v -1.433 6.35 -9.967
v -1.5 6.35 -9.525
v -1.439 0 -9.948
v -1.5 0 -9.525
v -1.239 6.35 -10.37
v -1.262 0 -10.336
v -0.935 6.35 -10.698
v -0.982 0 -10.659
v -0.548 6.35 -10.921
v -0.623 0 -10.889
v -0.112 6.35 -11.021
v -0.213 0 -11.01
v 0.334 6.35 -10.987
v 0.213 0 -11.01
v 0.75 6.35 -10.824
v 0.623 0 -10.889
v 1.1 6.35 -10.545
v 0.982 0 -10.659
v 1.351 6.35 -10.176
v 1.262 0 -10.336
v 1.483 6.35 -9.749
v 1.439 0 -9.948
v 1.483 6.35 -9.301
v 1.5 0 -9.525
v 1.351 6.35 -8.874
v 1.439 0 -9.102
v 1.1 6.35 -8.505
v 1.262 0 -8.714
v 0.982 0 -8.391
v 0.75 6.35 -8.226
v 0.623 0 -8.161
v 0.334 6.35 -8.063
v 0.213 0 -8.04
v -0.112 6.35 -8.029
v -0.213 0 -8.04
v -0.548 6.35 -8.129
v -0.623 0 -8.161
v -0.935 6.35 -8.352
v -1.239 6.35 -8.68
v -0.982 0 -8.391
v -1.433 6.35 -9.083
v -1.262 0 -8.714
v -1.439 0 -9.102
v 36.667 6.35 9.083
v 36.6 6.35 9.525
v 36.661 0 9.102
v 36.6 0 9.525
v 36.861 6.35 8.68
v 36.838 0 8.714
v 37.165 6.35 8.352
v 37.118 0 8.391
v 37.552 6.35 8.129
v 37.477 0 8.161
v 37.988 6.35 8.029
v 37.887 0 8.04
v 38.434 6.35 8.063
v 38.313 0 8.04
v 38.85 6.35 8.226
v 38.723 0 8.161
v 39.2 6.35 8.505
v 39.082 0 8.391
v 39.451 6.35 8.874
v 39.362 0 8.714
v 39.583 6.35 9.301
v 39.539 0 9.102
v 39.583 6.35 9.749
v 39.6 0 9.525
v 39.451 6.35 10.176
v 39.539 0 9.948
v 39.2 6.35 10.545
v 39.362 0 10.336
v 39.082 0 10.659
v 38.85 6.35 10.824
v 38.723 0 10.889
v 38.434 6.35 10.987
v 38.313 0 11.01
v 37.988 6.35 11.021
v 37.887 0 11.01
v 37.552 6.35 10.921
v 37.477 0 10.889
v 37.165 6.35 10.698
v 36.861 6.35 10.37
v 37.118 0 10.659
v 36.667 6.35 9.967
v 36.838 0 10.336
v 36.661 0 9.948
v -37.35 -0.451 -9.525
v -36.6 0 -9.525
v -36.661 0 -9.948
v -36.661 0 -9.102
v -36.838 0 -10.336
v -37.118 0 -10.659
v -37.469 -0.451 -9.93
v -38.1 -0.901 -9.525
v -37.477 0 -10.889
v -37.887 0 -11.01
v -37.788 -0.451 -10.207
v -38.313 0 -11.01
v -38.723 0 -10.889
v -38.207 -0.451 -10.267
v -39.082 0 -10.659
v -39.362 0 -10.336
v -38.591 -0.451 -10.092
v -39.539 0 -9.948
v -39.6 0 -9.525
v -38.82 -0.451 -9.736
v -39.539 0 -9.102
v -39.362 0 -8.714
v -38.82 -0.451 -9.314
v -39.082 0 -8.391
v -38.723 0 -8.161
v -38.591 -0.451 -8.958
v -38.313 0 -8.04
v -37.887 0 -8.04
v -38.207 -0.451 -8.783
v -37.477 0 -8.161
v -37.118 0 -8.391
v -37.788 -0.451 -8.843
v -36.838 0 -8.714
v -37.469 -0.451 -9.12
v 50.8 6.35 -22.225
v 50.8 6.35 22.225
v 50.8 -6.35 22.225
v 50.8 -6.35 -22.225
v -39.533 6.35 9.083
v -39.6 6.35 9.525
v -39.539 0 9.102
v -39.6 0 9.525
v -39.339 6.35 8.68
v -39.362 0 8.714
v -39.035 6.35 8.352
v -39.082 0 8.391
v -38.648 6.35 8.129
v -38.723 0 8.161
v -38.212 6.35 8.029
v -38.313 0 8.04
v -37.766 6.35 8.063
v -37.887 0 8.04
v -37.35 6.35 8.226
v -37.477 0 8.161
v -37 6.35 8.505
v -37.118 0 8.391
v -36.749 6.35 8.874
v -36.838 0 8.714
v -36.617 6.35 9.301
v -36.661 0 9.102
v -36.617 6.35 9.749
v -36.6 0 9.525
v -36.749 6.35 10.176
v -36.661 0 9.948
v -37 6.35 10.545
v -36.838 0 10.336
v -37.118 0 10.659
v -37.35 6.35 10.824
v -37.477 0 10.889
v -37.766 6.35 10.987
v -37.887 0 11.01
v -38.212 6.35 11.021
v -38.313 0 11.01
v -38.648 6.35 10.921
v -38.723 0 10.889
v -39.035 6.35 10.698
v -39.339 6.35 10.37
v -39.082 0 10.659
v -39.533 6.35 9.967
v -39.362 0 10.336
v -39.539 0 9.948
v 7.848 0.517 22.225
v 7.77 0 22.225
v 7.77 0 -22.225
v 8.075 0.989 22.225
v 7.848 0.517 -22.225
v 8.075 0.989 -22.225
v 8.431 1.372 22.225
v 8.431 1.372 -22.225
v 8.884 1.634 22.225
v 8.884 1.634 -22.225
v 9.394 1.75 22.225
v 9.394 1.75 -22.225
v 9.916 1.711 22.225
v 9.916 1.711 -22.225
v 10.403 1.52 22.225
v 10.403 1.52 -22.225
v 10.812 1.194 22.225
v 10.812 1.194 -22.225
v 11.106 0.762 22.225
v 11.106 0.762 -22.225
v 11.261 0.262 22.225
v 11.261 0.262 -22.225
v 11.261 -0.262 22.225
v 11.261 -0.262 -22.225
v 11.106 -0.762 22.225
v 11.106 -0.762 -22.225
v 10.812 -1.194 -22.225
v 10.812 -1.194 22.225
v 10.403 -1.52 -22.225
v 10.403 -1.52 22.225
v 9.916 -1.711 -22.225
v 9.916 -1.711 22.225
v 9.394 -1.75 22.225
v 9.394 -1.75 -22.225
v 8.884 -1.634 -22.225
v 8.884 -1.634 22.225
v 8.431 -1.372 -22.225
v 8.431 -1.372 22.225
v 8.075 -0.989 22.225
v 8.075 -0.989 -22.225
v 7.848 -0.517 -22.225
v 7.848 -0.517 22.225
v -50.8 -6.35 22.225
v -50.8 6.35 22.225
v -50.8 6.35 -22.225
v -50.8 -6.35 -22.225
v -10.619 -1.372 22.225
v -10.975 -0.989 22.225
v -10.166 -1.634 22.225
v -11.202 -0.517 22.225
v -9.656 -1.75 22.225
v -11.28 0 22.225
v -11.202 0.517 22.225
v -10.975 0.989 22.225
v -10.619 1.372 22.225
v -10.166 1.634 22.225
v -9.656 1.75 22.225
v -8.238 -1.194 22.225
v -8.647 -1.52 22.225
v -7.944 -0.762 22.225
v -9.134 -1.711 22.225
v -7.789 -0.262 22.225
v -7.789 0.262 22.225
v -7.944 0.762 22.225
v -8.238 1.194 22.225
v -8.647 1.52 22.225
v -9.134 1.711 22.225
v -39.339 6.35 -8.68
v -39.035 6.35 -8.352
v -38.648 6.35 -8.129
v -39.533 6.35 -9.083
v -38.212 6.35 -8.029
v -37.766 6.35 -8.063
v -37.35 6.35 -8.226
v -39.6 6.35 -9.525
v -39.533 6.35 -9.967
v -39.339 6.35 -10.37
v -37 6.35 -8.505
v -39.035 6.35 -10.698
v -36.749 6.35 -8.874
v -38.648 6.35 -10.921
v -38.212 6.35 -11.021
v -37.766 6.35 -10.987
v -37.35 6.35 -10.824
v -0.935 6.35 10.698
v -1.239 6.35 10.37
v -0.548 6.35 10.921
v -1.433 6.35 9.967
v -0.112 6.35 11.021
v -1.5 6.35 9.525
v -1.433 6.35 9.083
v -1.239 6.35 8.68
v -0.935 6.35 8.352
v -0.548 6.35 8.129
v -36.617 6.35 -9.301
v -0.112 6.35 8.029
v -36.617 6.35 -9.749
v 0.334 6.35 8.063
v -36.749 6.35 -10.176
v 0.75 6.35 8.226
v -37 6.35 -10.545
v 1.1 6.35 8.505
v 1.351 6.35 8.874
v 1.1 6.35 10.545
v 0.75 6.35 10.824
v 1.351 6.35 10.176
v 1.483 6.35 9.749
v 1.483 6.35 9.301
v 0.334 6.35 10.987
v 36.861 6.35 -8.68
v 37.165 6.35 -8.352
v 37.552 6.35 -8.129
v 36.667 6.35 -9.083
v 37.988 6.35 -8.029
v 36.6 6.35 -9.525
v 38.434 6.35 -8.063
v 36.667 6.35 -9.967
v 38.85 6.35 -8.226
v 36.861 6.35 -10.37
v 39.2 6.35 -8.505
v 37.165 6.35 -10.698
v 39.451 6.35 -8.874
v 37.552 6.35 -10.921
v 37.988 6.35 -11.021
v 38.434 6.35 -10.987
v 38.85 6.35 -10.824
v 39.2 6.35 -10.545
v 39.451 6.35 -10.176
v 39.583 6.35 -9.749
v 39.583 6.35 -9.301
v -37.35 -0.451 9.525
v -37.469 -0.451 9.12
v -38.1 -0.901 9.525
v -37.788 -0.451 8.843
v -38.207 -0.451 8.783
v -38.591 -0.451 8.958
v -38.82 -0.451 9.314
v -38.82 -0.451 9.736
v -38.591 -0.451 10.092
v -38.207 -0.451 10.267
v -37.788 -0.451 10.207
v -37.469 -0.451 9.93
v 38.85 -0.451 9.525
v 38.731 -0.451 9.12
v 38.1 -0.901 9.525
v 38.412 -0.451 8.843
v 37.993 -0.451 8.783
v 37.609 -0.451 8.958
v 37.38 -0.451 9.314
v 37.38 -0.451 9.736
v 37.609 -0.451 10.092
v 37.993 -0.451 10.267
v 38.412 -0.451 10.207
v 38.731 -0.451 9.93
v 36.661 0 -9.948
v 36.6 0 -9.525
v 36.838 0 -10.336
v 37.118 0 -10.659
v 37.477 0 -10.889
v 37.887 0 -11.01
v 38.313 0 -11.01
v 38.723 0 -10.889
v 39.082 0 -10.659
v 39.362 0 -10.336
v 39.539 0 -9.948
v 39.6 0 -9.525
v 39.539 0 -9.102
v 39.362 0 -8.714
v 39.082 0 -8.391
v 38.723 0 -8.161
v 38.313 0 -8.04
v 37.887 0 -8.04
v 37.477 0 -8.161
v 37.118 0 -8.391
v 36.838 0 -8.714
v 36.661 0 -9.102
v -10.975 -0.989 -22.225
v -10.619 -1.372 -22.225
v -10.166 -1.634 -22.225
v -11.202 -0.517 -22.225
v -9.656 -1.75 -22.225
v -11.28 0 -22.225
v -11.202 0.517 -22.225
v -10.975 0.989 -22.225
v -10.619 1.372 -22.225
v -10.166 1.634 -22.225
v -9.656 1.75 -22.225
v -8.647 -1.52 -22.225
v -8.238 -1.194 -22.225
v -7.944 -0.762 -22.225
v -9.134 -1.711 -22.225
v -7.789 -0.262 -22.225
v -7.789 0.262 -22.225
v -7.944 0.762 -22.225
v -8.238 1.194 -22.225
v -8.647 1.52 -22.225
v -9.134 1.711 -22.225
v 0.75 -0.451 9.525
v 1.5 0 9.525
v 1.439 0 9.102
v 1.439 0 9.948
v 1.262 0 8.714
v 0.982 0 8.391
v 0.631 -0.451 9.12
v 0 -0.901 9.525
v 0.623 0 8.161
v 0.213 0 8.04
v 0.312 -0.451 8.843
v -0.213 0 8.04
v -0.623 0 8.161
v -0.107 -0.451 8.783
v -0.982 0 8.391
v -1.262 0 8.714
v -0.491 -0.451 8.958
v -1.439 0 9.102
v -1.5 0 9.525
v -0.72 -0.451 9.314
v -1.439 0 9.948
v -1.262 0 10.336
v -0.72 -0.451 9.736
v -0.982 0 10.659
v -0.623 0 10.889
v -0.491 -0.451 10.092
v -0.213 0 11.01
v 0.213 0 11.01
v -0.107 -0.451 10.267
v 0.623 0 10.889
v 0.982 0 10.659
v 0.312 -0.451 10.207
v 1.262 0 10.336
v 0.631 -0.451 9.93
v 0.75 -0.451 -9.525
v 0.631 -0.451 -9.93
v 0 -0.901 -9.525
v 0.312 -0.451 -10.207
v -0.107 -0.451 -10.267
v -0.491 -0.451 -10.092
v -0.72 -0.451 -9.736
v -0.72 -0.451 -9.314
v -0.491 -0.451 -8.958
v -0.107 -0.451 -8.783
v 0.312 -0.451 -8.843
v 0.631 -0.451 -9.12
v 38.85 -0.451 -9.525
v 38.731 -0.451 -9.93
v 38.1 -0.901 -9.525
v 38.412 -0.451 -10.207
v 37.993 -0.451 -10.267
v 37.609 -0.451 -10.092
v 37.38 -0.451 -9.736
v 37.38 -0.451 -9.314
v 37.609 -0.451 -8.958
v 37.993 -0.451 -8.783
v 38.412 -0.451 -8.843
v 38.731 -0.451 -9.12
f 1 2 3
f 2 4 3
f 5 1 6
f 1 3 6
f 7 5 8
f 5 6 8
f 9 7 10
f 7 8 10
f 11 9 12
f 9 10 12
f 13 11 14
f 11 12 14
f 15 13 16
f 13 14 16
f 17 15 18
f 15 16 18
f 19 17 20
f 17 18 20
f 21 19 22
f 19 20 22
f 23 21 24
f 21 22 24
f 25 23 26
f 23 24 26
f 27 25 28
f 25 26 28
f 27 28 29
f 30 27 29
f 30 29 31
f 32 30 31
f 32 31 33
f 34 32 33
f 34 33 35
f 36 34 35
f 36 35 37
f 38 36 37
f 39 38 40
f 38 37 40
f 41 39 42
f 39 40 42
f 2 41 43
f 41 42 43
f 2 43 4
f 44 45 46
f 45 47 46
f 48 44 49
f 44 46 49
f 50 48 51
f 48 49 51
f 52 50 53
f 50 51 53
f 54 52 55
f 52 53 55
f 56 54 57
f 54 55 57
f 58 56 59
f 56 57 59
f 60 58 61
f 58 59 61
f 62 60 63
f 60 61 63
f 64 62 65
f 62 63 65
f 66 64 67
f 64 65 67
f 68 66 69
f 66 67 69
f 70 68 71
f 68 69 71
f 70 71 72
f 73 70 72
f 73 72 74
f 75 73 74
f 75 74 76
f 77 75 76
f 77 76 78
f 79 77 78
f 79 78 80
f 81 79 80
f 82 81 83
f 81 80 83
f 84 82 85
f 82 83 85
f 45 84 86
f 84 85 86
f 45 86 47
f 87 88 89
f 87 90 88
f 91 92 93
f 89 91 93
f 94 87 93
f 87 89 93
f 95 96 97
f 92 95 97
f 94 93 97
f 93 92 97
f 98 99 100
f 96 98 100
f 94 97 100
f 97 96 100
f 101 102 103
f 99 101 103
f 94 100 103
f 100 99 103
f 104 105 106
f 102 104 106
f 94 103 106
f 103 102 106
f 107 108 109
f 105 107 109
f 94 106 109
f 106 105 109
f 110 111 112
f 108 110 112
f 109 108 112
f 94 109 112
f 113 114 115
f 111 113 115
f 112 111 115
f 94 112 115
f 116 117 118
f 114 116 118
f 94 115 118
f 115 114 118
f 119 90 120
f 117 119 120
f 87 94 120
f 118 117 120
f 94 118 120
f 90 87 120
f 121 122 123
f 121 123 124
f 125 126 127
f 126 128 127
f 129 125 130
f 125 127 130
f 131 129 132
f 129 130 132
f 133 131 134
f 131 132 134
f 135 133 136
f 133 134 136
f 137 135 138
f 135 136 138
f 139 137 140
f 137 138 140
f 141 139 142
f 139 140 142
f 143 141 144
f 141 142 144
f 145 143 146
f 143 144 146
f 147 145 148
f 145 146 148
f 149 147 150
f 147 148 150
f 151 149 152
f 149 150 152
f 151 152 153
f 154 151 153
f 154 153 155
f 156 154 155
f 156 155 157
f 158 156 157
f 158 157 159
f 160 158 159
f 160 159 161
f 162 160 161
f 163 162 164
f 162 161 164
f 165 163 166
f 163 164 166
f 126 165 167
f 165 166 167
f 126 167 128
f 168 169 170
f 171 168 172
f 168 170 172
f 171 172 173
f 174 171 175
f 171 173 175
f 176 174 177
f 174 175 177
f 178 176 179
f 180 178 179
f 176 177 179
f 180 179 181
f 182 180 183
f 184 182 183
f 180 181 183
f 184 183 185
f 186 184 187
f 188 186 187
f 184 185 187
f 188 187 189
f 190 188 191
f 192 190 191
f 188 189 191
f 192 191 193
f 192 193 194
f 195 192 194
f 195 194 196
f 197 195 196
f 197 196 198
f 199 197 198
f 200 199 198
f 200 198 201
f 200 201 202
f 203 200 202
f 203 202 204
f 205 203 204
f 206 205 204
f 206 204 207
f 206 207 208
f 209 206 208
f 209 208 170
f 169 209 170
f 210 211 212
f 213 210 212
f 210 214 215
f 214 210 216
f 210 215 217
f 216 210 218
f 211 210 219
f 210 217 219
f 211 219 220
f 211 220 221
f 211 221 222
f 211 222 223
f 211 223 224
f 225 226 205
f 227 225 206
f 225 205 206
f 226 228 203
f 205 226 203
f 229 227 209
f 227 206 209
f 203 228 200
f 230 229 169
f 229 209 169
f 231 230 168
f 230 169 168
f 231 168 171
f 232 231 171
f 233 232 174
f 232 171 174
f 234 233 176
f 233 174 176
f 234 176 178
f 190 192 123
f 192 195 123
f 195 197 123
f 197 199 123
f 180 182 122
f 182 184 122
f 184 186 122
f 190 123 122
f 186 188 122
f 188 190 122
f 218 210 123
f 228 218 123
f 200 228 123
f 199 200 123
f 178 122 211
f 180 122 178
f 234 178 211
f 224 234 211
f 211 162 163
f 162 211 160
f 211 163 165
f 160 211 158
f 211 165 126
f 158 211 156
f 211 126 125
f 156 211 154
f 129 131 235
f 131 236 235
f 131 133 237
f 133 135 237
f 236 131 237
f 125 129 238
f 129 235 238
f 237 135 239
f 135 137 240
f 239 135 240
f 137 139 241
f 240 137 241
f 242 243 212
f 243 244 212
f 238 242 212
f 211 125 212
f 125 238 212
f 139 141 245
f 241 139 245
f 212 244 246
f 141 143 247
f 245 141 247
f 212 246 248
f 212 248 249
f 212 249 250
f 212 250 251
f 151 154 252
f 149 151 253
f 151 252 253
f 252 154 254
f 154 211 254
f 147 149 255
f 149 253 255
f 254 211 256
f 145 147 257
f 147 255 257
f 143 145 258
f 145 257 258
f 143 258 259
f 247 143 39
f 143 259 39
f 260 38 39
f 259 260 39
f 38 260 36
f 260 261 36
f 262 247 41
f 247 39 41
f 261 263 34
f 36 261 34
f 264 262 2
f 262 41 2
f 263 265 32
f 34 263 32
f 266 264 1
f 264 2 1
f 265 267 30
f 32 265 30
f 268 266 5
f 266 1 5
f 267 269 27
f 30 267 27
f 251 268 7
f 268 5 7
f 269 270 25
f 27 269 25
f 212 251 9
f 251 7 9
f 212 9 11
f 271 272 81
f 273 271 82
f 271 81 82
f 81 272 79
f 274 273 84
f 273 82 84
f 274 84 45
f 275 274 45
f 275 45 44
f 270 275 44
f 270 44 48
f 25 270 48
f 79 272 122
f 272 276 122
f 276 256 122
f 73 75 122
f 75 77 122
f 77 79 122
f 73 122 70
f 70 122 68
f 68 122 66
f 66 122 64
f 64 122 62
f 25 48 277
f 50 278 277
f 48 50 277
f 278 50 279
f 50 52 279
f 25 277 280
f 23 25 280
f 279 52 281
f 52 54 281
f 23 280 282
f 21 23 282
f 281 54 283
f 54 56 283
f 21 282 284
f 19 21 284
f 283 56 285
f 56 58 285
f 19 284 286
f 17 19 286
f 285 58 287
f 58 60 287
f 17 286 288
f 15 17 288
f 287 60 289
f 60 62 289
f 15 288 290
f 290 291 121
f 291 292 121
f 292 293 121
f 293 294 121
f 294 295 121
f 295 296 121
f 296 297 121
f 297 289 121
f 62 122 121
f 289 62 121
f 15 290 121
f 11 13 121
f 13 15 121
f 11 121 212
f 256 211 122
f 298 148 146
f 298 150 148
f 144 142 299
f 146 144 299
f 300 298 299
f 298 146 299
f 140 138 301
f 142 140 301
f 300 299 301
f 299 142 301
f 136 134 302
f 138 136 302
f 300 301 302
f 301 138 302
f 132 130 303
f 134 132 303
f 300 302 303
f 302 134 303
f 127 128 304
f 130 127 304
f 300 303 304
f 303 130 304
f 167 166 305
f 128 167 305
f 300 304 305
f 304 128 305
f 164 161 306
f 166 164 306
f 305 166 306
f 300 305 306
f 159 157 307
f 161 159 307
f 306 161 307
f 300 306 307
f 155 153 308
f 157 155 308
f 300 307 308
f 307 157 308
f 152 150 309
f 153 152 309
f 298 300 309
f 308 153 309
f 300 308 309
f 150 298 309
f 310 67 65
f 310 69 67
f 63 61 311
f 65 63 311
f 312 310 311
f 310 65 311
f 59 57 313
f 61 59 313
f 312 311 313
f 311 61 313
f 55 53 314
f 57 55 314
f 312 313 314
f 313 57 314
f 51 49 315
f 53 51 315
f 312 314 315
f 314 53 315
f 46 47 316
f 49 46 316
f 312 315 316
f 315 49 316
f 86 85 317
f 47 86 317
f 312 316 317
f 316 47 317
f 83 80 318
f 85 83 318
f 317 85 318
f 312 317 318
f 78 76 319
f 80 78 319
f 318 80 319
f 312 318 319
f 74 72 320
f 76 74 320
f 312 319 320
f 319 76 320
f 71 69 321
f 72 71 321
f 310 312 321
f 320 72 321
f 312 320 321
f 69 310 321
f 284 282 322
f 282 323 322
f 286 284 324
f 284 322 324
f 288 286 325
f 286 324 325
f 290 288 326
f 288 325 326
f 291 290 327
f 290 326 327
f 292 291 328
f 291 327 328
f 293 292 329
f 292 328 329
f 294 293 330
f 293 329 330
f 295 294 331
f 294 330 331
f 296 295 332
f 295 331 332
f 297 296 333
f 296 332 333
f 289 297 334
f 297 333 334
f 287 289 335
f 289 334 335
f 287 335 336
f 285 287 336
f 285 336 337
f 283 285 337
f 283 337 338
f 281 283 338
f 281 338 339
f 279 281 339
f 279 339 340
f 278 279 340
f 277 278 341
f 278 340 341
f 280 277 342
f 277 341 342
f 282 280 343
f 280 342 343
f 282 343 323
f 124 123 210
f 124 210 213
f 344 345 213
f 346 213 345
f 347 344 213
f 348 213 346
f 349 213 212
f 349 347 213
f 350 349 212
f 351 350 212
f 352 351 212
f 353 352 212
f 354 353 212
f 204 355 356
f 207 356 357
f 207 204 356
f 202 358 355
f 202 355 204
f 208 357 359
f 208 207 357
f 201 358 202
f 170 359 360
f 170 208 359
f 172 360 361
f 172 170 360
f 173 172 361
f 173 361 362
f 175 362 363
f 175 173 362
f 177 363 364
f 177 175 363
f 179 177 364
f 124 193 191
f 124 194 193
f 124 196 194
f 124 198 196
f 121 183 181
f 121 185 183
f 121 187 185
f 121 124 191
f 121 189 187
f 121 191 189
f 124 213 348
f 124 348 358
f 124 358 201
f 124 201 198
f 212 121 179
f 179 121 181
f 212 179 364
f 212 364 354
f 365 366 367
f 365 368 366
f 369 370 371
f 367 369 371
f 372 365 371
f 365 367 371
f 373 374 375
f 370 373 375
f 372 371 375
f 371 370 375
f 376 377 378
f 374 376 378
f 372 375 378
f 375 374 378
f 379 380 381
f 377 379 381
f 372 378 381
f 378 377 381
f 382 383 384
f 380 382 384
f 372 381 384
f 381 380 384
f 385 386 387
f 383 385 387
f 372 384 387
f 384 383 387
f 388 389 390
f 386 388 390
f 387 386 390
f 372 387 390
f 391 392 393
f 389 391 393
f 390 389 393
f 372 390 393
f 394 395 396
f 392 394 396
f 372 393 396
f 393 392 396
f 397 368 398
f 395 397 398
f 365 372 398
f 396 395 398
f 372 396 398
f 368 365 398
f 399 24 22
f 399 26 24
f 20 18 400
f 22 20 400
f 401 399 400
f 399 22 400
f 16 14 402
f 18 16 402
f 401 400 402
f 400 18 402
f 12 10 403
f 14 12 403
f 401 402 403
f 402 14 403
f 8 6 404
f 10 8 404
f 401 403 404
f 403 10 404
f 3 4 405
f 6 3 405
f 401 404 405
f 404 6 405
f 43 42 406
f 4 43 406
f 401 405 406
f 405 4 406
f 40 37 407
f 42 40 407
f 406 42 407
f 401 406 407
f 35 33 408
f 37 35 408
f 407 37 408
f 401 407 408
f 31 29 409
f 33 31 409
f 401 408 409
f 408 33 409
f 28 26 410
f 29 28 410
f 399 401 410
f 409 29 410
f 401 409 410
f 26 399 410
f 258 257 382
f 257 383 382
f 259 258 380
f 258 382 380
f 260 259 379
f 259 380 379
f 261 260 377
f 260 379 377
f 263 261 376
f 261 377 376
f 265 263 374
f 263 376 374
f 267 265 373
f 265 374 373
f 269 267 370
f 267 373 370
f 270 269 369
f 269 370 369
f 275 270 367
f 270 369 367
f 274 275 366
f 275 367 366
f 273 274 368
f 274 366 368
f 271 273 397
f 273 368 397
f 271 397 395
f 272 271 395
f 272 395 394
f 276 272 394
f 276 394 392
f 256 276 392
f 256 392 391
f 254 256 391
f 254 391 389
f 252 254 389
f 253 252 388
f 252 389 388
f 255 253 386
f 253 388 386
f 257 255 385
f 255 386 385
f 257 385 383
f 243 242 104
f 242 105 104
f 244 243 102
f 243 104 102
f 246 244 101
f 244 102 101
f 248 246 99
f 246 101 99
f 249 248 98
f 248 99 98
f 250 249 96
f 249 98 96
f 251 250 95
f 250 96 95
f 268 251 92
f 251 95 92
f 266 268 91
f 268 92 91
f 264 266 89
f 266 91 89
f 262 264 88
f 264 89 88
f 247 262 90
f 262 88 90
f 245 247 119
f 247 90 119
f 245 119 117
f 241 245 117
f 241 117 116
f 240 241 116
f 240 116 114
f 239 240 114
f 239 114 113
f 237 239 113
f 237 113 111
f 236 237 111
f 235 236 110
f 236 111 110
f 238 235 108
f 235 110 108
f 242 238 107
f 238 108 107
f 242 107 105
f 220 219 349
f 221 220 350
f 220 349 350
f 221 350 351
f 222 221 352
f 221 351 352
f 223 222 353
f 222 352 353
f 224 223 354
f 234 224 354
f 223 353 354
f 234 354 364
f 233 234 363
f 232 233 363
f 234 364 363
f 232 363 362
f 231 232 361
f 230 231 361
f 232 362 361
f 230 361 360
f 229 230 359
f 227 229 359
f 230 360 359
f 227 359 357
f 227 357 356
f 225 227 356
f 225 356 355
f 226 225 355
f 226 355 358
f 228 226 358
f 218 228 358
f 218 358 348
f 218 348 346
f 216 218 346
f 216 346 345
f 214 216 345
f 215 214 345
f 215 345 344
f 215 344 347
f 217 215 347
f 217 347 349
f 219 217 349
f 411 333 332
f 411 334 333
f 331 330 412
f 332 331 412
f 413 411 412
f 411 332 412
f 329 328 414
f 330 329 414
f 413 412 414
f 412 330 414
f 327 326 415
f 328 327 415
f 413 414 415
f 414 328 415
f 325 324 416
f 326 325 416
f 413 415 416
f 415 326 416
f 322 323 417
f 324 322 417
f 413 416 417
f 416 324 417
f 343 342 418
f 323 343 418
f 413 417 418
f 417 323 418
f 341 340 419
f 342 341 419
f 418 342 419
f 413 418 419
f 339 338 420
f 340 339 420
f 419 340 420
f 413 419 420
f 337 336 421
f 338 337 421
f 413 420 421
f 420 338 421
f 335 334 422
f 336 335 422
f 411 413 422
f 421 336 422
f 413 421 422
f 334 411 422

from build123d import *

# Parameters (mm, degrees)
SKETCH1_W                 = 44.45
SKETCH1_H                 = 12.7
BOSS_EXTRUDE1_DEPTH       = 50.8
M3_10_THREADED_HOLE_D     = 3
M3_10_THREADED_HOLE_DEPTH = 6.35
M3_10_THREADED_HOLE_TIP   = 0.901290929
F_6_32_THREADED_HOLE_D    = 3.51028


with BuildPart() as part:
    # Sketch1 → Boss-Extrude1 (new, symmetric)
    with BuildSketch(Plane(origin=(0, 0, 0), x_dir=(0, 0, -1), z_dir=(1, 0, 0))):
        Rectangle(SKETCH1_W, SKETCH1_H)
    extrude(amount=BOSS_EXTRUDE1_DEPTH, both=True)

    # M3-10 Threaded Hole
    with Locations(Plane(origin=(0, 6.35, 0), x_dir=(1, 0, 0), z_dir=(0, 1, 0))):
        with Locations((-38.1, -9.525), (0, -9.525), (38.1, -9.525), (-38.1, 9.525), (0, 9.525), (38.1, 9.525)):
            Hole(M3_10_THREADED_HOLE_D / 2, depth=M3_10_THREADED_HOLE_DEPTH)
            with Locations((0, 0, -(M3_10_THREADED_HOLE_DEPTH + M3_10_THREADED_HOLE_TIP / 2))):  # 118° drill point
                Cone(0, M3_10_THREADED_HOLE_D / 2, M3_10_THREADED_HOLE_TIP, mode=Mode.SUBTRACT)

    # #6-32 Threaded Hole (through all)
    with Locations(Plane.XY.offset(22.225)):
        with Locations((-9.525, 0), (9.525, 0)):
            Hole(F_6_32_THREADED_HOLE_D / 2)


solid = part.part
